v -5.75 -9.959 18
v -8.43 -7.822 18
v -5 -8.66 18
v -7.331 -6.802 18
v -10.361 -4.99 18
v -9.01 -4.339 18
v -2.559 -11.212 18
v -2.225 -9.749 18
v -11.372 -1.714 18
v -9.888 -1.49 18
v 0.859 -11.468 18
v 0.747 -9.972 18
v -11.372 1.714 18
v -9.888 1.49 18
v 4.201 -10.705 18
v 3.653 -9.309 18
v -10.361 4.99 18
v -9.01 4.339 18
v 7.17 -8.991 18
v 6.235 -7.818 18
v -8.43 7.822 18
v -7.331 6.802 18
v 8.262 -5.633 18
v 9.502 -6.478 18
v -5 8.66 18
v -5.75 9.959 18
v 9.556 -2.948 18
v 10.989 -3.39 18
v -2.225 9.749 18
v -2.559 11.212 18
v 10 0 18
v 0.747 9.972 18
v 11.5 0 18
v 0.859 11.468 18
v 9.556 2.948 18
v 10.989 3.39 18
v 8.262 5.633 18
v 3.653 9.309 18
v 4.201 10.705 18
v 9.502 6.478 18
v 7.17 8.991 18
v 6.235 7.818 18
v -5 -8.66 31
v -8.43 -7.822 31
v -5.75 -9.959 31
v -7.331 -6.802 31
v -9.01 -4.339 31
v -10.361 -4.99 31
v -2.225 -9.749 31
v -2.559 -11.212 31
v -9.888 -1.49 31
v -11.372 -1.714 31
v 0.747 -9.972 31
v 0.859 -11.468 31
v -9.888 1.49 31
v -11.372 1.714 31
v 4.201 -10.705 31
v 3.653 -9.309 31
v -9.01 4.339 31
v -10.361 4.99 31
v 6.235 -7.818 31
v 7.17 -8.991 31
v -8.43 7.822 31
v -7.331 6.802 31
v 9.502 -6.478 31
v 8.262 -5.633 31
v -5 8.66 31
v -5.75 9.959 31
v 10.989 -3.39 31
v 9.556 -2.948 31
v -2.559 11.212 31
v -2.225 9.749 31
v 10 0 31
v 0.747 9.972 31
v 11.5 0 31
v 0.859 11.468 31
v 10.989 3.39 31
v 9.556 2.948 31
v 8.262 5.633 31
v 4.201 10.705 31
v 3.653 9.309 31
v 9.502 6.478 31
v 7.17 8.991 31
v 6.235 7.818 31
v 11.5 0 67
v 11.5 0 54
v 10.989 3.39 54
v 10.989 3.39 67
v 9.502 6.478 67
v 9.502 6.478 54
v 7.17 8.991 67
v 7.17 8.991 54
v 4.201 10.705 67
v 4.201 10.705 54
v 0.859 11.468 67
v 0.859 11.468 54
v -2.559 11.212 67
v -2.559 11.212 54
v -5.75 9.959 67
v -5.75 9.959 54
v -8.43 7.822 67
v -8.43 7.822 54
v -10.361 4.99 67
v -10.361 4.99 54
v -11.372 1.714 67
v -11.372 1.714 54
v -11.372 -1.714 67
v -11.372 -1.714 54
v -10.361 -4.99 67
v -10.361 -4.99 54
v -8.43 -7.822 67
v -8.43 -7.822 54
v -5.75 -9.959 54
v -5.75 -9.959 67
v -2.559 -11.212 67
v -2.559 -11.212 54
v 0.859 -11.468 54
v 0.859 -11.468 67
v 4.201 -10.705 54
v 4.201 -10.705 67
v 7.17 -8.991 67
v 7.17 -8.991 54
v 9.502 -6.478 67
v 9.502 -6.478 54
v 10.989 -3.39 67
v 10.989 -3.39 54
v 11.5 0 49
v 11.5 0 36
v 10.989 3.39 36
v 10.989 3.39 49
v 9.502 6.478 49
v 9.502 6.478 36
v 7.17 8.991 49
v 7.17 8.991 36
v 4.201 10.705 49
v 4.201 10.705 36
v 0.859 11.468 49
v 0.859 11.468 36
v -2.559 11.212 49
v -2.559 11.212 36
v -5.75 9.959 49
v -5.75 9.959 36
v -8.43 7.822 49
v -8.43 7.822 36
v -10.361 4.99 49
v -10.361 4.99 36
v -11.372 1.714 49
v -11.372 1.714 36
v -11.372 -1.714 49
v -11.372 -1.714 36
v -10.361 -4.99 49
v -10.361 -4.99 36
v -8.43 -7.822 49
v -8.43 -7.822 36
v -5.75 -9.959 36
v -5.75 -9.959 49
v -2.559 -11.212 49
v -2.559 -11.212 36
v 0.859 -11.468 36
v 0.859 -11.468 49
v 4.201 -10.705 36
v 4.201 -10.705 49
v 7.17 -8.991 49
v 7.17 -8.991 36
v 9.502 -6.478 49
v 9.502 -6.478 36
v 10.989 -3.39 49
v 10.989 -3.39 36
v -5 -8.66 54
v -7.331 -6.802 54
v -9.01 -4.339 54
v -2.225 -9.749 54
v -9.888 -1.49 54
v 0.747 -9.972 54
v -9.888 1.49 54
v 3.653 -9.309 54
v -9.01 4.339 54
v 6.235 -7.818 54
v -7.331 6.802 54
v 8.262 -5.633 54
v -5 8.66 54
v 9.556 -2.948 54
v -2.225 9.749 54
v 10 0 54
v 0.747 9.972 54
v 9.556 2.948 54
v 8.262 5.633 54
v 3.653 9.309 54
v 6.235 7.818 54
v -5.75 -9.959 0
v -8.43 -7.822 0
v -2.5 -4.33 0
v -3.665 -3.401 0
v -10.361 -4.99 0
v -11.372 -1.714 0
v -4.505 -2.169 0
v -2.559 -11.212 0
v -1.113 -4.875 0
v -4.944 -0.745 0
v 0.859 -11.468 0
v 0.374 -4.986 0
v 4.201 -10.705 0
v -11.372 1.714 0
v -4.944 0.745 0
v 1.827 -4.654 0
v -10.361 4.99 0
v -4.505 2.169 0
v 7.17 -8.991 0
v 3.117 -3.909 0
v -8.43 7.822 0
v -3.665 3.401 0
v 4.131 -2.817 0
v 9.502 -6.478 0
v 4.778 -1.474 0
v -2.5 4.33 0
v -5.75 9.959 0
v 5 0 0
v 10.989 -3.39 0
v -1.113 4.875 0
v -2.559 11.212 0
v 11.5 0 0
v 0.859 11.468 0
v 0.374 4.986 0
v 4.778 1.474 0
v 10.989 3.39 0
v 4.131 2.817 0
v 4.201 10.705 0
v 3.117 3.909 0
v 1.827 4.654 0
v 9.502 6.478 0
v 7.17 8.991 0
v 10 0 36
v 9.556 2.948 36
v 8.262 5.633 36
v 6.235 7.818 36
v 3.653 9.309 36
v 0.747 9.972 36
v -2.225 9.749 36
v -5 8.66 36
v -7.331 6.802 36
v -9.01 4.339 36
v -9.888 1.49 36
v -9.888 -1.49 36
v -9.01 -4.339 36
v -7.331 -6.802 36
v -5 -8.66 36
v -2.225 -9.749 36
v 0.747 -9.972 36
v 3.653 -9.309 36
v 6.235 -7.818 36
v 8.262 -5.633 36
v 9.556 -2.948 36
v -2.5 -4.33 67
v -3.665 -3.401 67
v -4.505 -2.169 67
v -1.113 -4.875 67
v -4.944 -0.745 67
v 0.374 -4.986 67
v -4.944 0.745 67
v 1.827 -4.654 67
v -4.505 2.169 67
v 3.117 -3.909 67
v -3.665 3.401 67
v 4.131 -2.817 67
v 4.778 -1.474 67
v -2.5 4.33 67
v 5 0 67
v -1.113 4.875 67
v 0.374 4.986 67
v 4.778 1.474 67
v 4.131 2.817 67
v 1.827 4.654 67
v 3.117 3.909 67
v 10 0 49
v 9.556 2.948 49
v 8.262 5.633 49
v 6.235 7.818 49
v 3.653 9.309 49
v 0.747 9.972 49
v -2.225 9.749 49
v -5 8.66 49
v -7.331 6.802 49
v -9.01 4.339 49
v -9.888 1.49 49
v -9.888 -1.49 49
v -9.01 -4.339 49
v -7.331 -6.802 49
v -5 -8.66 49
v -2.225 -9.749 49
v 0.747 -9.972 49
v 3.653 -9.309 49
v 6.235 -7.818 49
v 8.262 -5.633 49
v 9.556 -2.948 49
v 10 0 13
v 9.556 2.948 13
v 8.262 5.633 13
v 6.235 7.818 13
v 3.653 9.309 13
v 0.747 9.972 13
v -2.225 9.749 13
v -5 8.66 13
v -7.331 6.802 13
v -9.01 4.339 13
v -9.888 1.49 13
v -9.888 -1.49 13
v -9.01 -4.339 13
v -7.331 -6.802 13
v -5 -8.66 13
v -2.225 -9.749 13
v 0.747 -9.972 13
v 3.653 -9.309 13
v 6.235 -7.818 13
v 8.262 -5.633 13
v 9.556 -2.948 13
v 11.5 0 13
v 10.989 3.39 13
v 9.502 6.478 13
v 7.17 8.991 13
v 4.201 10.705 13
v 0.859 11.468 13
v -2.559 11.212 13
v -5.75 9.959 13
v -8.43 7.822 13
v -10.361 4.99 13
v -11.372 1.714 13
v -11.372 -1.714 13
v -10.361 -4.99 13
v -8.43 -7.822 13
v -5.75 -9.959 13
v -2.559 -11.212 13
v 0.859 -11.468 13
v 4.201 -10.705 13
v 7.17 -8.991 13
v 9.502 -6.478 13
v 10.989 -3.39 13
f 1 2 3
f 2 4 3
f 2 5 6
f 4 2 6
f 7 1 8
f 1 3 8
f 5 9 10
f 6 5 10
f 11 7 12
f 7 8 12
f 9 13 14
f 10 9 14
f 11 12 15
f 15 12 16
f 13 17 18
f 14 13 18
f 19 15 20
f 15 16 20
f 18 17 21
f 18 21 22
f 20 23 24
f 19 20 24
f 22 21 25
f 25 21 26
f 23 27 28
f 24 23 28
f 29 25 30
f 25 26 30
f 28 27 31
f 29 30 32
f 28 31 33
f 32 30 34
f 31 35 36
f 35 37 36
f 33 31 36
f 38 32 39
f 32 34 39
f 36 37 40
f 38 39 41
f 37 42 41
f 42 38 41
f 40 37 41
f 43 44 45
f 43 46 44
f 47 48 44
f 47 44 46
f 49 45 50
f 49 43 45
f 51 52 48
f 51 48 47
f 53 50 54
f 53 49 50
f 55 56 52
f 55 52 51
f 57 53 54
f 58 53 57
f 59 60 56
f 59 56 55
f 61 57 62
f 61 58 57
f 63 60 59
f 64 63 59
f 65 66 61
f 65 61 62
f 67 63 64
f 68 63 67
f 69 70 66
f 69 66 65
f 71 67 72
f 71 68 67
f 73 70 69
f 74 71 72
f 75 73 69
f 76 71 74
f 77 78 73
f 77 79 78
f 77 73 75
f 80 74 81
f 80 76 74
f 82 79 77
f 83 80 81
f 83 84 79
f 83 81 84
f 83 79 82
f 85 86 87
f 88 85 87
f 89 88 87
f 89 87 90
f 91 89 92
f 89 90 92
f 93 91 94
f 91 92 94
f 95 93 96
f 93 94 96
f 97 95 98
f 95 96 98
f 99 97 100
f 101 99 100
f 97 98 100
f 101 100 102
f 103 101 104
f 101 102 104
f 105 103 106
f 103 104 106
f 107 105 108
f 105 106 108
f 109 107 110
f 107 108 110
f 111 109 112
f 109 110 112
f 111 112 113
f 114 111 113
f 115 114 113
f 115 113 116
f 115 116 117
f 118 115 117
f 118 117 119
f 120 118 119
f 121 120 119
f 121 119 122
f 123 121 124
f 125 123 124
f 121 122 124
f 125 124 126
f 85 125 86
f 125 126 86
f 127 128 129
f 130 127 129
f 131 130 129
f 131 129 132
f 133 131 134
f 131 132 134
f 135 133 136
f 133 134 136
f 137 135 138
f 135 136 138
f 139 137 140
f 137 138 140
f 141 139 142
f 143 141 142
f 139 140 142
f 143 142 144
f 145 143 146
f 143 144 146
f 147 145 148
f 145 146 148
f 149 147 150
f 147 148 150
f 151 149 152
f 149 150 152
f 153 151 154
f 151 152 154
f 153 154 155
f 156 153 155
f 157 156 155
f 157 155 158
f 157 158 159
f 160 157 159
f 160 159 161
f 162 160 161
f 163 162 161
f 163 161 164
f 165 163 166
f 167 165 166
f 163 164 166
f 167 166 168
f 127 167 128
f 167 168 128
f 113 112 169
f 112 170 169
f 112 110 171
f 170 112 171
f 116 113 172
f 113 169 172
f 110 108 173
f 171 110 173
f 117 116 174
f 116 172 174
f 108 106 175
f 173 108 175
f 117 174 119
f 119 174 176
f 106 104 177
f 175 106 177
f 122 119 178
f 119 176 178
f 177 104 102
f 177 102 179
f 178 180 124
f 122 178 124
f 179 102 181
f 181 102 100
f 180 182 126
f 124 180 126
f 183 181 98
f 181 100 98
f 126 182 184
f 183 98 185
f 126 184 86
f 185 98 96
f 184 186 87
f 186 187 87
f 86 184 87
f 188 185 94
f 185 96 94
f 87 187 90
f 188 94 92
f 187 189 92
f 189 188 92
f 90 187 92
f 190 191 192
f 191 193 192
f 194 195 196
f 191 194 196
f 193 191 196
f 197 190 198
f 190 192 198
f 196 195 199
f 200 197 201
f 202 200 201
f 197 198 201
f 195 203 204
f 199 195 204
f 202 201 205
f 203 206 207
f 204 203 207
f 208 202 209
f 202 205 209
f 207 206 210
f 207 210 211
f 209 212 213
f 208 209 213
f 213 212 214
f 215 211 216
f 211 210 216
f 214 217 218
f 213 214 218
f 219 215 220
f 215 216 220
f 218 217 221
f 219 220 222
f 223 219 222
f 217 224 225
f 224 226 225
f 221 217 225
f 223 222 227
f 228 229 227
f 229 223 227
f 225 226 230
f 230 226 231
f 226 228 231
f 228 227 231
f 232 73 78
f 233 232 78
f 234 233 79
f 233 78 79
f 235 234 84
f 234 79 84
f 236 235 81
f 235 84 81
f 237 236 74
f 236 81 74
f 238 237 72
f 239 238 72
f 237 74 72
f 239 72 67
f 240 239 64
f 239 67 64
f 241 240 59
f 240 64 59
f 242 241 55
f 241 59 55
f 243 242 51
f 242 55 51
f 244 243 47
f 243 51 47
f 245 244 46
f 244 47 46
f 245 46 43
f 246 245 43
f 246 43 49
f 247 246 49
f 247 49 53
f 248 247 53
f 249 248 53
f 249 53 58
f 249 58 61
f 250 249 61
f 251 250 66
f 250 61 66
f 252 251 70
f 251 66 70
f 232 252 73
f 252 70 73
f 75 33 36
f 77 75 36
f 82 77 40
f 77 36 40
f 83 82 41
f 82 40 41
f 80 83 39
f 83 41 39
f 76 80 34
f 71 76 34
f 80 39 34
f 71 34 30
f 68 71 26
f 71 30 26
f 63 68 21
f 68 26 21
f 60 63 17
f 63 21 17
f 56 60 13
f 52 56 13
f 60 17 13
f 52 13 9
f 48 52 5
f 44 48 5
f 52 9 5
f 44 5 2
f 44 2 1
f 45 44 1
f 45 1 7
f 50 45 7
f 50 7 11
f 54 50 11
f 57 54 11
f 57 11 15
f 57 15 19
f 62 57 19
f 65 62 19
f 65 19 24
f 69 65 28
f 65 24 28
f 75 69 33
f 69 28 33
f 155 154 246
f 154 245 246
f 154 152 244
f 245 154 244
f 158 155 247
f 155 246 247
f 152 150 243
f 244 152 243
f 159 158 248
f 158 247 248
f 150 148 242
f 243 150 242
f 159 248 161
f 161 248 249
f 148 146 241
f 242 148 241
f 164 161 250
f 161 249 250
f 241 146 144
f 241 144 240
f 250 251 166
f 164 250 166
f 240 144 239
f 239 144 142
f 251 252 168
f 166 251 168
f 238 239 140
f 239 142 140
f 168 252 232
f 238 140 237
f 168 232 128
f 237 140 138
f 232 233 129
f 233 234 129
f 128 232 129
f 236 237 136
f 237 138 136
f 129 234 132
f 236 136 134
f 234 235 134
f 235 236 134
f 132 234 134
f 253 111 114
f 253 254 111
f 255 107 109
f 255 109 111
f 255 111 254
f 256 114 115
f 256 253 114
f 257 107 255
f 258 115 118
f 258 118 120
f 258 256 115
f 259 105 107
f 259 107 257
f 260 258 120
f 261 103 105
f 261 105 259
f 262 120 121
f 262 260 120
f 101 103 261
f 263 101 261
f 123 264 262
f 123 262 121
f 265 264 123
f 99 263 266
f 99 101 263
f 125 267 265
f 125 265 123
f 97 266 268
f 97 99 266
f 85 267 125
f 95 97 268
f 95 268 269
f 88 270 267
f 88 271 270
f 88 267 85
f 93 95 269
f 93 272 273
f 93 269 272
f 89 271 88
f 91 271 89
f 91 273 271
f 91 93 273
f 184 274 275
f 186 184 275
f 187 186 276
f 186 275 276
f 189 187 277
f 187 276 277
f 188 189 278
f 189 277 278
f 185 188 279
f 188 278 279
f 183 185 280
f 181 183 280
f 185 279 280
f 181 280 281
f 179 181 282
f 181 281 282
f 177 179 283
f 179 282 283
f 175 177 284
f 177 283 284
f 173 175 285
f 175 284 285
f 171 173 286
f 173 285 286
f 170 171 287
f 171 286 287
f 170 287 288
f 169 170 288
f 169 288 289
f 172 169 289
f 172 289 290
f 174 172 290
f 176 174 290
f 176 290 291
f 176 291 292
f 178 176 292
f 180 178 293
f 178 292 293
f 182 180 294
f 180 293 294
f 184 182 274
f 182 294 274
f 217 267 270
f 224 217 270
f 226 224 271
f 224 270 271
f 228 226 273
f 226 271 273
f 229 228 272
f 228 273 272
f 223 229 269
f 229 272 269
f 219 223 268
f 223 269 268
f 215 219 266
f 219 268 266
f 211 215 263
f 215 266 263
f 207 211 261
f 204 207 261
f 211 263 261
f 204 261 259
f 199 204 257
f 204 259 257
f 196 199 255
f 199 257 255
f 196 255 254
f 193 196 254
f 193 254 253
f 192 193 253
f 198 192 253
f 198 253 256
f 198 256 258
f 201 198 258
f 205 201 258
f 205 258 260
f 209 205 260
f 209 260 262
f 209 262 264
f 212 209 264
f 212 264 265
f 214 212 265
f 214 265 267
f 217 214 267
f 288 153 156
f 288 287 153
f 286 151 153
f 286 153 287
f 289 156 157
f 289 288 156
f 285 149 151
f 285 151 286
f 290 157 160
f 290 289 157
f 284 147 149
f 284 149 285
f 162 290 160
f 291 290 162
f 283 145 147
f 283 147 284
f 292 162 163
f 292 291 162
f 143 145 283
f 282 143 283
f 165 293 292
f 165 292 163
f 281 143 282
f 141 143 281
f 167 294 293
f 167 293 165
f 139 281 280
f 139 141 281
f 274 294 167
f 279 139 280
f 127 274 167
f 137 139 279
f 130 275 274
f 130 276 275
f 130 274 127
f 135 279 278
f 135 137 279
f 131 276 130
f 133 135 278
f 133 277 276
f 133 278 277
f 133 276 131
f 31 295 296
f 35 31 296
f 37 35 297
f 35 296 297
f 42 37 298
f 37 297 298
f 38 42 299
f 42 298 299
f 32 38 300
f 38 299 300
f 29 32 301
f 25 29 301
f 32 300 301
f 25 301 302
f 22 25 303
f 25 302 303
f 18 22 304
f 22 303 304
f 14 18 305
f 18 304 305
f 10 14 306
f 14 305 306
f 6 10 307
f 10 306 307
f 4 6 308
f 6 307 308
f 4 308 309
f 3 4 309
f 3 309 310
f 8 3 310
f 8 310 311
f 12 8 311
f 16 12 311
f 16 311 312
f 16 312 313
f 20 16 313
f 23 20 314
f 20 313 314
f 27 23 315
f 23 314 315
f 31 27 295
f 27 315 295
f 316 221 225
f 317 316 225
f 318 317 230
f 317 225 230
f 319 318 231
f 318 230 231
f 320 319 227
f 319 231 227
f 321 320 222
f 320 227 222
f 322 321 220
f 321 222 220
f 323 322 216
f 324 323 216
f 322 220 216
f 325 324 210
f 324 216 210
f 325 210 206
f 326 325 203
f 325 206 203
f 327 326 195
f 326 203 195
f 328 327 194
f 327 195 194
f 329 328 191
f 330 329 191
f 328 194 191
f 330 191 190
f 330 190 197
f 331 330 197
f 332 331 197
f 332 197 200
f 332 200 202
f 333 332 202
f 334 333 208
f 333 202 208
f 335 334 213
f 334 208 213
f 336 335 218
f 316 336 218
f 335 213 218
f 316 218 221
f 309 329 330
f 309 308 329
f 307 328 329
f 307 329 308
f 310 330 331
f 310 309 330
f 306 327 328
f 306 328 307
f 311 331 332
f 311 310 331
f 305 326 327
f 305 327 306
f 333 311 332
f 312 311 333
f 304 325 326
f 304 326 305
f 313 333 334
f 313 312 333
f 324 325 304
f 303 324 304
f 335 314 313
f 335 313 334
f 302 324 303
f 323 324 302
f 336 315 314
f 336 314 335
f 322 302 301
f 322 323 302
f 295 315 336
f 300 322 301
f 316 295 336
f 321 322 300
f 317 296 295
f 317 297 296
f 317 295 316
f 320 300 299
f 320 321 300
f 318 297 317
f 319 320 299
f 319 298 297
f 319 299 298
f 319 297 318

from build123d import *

# Parameters (mm, degrees)
SKETCH1_R           = 11.5
BOSS_EXTRUDE1_DEPTH = 13
SKETCH2_R           = 10
BOSS_EXTRUDE2_DEPTH = 5
SKETCH3_R           = 11.5
BOSS_EXTRUDE3_DEPTH = 13
SKETCH4_R           = 10
BOSS_EXTRUDE4_DEPTH = 5
SKETCH5_R           = 11.5
BOSS_EXTRUDE5_DEPTH = 13
SKETCH6_R           = 10
BOSS_EXTRUDE6_DEPTH = 5
SKETCH7_R           = 11.5
BOSS_EXTRUDE7_DEPTH = 13
SKETCH8_R           = 5
CUT_EXTRUDE1_DEPTH  = 68


with BuildPart() as part:
    # Sketch1 → Boss-Extrude1 (new body)
    with BuildSketch(Plane.XY):
        Circle(SKETCH1_R)
    extrude(amount=BOSS_EXTRUDE1_DEPTH)

    # Sketch2 → Boss-Extrude2 (add)
    with BuildSketch(Plane.XY.offset(13)):
        Circle(SKETCH2_R)
    extrude(amount=BOSS_EXTRUDE2_DEPTH)

    # Sketch3 → Boss-Extrude3 (add)
    with BuildSketch(Plane.XY.offset(18)):
        Circle(SKETCH3_R)
    extrude(amount=BOSS_EXTRUDE3_DEPTH)

    # Sketch4 → Boss-Extrude4 (add)
    with BuildSketch(Plane.XY.offset(31)):
        Circle(SKETCH4_R)
    extrude(amount=BOSS_EXTRUDE4_DEPTH)

    # Sketch5 → Boss-Extrude5 (add)
    with BuildSketch(Plane.XY.offset(36)):
        Circle(SKETCH5_R)
    extrude(amount=BOSS_EXTRUDE5_DEPTH)

    # Sketch6 → Boss-Extrude6 (add)
    with BuildSketch(Plane.XY.offset(49)):
        Circle(SKETCH6_R)
    extrude(amount=BOSS_EXTRUDE6_DEPTH)

    # Sketch7 → Boss-Extrude7 (add)
    with BuildSketch(Plane.XY.offset(54)):
        Circle(SKETCH7_R)
    extrude(amount=BOSS_EXTRUDE7_DEPTH)

    # Sketch8 → Cut-Extrude1 (cut, through all)
    with BuildSketch(Plane.XY.offset(67)):
        Circle(SKETCH8_R)
    extrude(amount=-CUT_EXTRUDE1_DEPTH, mode=Mode.SUBTRACT)


solid = part.part
